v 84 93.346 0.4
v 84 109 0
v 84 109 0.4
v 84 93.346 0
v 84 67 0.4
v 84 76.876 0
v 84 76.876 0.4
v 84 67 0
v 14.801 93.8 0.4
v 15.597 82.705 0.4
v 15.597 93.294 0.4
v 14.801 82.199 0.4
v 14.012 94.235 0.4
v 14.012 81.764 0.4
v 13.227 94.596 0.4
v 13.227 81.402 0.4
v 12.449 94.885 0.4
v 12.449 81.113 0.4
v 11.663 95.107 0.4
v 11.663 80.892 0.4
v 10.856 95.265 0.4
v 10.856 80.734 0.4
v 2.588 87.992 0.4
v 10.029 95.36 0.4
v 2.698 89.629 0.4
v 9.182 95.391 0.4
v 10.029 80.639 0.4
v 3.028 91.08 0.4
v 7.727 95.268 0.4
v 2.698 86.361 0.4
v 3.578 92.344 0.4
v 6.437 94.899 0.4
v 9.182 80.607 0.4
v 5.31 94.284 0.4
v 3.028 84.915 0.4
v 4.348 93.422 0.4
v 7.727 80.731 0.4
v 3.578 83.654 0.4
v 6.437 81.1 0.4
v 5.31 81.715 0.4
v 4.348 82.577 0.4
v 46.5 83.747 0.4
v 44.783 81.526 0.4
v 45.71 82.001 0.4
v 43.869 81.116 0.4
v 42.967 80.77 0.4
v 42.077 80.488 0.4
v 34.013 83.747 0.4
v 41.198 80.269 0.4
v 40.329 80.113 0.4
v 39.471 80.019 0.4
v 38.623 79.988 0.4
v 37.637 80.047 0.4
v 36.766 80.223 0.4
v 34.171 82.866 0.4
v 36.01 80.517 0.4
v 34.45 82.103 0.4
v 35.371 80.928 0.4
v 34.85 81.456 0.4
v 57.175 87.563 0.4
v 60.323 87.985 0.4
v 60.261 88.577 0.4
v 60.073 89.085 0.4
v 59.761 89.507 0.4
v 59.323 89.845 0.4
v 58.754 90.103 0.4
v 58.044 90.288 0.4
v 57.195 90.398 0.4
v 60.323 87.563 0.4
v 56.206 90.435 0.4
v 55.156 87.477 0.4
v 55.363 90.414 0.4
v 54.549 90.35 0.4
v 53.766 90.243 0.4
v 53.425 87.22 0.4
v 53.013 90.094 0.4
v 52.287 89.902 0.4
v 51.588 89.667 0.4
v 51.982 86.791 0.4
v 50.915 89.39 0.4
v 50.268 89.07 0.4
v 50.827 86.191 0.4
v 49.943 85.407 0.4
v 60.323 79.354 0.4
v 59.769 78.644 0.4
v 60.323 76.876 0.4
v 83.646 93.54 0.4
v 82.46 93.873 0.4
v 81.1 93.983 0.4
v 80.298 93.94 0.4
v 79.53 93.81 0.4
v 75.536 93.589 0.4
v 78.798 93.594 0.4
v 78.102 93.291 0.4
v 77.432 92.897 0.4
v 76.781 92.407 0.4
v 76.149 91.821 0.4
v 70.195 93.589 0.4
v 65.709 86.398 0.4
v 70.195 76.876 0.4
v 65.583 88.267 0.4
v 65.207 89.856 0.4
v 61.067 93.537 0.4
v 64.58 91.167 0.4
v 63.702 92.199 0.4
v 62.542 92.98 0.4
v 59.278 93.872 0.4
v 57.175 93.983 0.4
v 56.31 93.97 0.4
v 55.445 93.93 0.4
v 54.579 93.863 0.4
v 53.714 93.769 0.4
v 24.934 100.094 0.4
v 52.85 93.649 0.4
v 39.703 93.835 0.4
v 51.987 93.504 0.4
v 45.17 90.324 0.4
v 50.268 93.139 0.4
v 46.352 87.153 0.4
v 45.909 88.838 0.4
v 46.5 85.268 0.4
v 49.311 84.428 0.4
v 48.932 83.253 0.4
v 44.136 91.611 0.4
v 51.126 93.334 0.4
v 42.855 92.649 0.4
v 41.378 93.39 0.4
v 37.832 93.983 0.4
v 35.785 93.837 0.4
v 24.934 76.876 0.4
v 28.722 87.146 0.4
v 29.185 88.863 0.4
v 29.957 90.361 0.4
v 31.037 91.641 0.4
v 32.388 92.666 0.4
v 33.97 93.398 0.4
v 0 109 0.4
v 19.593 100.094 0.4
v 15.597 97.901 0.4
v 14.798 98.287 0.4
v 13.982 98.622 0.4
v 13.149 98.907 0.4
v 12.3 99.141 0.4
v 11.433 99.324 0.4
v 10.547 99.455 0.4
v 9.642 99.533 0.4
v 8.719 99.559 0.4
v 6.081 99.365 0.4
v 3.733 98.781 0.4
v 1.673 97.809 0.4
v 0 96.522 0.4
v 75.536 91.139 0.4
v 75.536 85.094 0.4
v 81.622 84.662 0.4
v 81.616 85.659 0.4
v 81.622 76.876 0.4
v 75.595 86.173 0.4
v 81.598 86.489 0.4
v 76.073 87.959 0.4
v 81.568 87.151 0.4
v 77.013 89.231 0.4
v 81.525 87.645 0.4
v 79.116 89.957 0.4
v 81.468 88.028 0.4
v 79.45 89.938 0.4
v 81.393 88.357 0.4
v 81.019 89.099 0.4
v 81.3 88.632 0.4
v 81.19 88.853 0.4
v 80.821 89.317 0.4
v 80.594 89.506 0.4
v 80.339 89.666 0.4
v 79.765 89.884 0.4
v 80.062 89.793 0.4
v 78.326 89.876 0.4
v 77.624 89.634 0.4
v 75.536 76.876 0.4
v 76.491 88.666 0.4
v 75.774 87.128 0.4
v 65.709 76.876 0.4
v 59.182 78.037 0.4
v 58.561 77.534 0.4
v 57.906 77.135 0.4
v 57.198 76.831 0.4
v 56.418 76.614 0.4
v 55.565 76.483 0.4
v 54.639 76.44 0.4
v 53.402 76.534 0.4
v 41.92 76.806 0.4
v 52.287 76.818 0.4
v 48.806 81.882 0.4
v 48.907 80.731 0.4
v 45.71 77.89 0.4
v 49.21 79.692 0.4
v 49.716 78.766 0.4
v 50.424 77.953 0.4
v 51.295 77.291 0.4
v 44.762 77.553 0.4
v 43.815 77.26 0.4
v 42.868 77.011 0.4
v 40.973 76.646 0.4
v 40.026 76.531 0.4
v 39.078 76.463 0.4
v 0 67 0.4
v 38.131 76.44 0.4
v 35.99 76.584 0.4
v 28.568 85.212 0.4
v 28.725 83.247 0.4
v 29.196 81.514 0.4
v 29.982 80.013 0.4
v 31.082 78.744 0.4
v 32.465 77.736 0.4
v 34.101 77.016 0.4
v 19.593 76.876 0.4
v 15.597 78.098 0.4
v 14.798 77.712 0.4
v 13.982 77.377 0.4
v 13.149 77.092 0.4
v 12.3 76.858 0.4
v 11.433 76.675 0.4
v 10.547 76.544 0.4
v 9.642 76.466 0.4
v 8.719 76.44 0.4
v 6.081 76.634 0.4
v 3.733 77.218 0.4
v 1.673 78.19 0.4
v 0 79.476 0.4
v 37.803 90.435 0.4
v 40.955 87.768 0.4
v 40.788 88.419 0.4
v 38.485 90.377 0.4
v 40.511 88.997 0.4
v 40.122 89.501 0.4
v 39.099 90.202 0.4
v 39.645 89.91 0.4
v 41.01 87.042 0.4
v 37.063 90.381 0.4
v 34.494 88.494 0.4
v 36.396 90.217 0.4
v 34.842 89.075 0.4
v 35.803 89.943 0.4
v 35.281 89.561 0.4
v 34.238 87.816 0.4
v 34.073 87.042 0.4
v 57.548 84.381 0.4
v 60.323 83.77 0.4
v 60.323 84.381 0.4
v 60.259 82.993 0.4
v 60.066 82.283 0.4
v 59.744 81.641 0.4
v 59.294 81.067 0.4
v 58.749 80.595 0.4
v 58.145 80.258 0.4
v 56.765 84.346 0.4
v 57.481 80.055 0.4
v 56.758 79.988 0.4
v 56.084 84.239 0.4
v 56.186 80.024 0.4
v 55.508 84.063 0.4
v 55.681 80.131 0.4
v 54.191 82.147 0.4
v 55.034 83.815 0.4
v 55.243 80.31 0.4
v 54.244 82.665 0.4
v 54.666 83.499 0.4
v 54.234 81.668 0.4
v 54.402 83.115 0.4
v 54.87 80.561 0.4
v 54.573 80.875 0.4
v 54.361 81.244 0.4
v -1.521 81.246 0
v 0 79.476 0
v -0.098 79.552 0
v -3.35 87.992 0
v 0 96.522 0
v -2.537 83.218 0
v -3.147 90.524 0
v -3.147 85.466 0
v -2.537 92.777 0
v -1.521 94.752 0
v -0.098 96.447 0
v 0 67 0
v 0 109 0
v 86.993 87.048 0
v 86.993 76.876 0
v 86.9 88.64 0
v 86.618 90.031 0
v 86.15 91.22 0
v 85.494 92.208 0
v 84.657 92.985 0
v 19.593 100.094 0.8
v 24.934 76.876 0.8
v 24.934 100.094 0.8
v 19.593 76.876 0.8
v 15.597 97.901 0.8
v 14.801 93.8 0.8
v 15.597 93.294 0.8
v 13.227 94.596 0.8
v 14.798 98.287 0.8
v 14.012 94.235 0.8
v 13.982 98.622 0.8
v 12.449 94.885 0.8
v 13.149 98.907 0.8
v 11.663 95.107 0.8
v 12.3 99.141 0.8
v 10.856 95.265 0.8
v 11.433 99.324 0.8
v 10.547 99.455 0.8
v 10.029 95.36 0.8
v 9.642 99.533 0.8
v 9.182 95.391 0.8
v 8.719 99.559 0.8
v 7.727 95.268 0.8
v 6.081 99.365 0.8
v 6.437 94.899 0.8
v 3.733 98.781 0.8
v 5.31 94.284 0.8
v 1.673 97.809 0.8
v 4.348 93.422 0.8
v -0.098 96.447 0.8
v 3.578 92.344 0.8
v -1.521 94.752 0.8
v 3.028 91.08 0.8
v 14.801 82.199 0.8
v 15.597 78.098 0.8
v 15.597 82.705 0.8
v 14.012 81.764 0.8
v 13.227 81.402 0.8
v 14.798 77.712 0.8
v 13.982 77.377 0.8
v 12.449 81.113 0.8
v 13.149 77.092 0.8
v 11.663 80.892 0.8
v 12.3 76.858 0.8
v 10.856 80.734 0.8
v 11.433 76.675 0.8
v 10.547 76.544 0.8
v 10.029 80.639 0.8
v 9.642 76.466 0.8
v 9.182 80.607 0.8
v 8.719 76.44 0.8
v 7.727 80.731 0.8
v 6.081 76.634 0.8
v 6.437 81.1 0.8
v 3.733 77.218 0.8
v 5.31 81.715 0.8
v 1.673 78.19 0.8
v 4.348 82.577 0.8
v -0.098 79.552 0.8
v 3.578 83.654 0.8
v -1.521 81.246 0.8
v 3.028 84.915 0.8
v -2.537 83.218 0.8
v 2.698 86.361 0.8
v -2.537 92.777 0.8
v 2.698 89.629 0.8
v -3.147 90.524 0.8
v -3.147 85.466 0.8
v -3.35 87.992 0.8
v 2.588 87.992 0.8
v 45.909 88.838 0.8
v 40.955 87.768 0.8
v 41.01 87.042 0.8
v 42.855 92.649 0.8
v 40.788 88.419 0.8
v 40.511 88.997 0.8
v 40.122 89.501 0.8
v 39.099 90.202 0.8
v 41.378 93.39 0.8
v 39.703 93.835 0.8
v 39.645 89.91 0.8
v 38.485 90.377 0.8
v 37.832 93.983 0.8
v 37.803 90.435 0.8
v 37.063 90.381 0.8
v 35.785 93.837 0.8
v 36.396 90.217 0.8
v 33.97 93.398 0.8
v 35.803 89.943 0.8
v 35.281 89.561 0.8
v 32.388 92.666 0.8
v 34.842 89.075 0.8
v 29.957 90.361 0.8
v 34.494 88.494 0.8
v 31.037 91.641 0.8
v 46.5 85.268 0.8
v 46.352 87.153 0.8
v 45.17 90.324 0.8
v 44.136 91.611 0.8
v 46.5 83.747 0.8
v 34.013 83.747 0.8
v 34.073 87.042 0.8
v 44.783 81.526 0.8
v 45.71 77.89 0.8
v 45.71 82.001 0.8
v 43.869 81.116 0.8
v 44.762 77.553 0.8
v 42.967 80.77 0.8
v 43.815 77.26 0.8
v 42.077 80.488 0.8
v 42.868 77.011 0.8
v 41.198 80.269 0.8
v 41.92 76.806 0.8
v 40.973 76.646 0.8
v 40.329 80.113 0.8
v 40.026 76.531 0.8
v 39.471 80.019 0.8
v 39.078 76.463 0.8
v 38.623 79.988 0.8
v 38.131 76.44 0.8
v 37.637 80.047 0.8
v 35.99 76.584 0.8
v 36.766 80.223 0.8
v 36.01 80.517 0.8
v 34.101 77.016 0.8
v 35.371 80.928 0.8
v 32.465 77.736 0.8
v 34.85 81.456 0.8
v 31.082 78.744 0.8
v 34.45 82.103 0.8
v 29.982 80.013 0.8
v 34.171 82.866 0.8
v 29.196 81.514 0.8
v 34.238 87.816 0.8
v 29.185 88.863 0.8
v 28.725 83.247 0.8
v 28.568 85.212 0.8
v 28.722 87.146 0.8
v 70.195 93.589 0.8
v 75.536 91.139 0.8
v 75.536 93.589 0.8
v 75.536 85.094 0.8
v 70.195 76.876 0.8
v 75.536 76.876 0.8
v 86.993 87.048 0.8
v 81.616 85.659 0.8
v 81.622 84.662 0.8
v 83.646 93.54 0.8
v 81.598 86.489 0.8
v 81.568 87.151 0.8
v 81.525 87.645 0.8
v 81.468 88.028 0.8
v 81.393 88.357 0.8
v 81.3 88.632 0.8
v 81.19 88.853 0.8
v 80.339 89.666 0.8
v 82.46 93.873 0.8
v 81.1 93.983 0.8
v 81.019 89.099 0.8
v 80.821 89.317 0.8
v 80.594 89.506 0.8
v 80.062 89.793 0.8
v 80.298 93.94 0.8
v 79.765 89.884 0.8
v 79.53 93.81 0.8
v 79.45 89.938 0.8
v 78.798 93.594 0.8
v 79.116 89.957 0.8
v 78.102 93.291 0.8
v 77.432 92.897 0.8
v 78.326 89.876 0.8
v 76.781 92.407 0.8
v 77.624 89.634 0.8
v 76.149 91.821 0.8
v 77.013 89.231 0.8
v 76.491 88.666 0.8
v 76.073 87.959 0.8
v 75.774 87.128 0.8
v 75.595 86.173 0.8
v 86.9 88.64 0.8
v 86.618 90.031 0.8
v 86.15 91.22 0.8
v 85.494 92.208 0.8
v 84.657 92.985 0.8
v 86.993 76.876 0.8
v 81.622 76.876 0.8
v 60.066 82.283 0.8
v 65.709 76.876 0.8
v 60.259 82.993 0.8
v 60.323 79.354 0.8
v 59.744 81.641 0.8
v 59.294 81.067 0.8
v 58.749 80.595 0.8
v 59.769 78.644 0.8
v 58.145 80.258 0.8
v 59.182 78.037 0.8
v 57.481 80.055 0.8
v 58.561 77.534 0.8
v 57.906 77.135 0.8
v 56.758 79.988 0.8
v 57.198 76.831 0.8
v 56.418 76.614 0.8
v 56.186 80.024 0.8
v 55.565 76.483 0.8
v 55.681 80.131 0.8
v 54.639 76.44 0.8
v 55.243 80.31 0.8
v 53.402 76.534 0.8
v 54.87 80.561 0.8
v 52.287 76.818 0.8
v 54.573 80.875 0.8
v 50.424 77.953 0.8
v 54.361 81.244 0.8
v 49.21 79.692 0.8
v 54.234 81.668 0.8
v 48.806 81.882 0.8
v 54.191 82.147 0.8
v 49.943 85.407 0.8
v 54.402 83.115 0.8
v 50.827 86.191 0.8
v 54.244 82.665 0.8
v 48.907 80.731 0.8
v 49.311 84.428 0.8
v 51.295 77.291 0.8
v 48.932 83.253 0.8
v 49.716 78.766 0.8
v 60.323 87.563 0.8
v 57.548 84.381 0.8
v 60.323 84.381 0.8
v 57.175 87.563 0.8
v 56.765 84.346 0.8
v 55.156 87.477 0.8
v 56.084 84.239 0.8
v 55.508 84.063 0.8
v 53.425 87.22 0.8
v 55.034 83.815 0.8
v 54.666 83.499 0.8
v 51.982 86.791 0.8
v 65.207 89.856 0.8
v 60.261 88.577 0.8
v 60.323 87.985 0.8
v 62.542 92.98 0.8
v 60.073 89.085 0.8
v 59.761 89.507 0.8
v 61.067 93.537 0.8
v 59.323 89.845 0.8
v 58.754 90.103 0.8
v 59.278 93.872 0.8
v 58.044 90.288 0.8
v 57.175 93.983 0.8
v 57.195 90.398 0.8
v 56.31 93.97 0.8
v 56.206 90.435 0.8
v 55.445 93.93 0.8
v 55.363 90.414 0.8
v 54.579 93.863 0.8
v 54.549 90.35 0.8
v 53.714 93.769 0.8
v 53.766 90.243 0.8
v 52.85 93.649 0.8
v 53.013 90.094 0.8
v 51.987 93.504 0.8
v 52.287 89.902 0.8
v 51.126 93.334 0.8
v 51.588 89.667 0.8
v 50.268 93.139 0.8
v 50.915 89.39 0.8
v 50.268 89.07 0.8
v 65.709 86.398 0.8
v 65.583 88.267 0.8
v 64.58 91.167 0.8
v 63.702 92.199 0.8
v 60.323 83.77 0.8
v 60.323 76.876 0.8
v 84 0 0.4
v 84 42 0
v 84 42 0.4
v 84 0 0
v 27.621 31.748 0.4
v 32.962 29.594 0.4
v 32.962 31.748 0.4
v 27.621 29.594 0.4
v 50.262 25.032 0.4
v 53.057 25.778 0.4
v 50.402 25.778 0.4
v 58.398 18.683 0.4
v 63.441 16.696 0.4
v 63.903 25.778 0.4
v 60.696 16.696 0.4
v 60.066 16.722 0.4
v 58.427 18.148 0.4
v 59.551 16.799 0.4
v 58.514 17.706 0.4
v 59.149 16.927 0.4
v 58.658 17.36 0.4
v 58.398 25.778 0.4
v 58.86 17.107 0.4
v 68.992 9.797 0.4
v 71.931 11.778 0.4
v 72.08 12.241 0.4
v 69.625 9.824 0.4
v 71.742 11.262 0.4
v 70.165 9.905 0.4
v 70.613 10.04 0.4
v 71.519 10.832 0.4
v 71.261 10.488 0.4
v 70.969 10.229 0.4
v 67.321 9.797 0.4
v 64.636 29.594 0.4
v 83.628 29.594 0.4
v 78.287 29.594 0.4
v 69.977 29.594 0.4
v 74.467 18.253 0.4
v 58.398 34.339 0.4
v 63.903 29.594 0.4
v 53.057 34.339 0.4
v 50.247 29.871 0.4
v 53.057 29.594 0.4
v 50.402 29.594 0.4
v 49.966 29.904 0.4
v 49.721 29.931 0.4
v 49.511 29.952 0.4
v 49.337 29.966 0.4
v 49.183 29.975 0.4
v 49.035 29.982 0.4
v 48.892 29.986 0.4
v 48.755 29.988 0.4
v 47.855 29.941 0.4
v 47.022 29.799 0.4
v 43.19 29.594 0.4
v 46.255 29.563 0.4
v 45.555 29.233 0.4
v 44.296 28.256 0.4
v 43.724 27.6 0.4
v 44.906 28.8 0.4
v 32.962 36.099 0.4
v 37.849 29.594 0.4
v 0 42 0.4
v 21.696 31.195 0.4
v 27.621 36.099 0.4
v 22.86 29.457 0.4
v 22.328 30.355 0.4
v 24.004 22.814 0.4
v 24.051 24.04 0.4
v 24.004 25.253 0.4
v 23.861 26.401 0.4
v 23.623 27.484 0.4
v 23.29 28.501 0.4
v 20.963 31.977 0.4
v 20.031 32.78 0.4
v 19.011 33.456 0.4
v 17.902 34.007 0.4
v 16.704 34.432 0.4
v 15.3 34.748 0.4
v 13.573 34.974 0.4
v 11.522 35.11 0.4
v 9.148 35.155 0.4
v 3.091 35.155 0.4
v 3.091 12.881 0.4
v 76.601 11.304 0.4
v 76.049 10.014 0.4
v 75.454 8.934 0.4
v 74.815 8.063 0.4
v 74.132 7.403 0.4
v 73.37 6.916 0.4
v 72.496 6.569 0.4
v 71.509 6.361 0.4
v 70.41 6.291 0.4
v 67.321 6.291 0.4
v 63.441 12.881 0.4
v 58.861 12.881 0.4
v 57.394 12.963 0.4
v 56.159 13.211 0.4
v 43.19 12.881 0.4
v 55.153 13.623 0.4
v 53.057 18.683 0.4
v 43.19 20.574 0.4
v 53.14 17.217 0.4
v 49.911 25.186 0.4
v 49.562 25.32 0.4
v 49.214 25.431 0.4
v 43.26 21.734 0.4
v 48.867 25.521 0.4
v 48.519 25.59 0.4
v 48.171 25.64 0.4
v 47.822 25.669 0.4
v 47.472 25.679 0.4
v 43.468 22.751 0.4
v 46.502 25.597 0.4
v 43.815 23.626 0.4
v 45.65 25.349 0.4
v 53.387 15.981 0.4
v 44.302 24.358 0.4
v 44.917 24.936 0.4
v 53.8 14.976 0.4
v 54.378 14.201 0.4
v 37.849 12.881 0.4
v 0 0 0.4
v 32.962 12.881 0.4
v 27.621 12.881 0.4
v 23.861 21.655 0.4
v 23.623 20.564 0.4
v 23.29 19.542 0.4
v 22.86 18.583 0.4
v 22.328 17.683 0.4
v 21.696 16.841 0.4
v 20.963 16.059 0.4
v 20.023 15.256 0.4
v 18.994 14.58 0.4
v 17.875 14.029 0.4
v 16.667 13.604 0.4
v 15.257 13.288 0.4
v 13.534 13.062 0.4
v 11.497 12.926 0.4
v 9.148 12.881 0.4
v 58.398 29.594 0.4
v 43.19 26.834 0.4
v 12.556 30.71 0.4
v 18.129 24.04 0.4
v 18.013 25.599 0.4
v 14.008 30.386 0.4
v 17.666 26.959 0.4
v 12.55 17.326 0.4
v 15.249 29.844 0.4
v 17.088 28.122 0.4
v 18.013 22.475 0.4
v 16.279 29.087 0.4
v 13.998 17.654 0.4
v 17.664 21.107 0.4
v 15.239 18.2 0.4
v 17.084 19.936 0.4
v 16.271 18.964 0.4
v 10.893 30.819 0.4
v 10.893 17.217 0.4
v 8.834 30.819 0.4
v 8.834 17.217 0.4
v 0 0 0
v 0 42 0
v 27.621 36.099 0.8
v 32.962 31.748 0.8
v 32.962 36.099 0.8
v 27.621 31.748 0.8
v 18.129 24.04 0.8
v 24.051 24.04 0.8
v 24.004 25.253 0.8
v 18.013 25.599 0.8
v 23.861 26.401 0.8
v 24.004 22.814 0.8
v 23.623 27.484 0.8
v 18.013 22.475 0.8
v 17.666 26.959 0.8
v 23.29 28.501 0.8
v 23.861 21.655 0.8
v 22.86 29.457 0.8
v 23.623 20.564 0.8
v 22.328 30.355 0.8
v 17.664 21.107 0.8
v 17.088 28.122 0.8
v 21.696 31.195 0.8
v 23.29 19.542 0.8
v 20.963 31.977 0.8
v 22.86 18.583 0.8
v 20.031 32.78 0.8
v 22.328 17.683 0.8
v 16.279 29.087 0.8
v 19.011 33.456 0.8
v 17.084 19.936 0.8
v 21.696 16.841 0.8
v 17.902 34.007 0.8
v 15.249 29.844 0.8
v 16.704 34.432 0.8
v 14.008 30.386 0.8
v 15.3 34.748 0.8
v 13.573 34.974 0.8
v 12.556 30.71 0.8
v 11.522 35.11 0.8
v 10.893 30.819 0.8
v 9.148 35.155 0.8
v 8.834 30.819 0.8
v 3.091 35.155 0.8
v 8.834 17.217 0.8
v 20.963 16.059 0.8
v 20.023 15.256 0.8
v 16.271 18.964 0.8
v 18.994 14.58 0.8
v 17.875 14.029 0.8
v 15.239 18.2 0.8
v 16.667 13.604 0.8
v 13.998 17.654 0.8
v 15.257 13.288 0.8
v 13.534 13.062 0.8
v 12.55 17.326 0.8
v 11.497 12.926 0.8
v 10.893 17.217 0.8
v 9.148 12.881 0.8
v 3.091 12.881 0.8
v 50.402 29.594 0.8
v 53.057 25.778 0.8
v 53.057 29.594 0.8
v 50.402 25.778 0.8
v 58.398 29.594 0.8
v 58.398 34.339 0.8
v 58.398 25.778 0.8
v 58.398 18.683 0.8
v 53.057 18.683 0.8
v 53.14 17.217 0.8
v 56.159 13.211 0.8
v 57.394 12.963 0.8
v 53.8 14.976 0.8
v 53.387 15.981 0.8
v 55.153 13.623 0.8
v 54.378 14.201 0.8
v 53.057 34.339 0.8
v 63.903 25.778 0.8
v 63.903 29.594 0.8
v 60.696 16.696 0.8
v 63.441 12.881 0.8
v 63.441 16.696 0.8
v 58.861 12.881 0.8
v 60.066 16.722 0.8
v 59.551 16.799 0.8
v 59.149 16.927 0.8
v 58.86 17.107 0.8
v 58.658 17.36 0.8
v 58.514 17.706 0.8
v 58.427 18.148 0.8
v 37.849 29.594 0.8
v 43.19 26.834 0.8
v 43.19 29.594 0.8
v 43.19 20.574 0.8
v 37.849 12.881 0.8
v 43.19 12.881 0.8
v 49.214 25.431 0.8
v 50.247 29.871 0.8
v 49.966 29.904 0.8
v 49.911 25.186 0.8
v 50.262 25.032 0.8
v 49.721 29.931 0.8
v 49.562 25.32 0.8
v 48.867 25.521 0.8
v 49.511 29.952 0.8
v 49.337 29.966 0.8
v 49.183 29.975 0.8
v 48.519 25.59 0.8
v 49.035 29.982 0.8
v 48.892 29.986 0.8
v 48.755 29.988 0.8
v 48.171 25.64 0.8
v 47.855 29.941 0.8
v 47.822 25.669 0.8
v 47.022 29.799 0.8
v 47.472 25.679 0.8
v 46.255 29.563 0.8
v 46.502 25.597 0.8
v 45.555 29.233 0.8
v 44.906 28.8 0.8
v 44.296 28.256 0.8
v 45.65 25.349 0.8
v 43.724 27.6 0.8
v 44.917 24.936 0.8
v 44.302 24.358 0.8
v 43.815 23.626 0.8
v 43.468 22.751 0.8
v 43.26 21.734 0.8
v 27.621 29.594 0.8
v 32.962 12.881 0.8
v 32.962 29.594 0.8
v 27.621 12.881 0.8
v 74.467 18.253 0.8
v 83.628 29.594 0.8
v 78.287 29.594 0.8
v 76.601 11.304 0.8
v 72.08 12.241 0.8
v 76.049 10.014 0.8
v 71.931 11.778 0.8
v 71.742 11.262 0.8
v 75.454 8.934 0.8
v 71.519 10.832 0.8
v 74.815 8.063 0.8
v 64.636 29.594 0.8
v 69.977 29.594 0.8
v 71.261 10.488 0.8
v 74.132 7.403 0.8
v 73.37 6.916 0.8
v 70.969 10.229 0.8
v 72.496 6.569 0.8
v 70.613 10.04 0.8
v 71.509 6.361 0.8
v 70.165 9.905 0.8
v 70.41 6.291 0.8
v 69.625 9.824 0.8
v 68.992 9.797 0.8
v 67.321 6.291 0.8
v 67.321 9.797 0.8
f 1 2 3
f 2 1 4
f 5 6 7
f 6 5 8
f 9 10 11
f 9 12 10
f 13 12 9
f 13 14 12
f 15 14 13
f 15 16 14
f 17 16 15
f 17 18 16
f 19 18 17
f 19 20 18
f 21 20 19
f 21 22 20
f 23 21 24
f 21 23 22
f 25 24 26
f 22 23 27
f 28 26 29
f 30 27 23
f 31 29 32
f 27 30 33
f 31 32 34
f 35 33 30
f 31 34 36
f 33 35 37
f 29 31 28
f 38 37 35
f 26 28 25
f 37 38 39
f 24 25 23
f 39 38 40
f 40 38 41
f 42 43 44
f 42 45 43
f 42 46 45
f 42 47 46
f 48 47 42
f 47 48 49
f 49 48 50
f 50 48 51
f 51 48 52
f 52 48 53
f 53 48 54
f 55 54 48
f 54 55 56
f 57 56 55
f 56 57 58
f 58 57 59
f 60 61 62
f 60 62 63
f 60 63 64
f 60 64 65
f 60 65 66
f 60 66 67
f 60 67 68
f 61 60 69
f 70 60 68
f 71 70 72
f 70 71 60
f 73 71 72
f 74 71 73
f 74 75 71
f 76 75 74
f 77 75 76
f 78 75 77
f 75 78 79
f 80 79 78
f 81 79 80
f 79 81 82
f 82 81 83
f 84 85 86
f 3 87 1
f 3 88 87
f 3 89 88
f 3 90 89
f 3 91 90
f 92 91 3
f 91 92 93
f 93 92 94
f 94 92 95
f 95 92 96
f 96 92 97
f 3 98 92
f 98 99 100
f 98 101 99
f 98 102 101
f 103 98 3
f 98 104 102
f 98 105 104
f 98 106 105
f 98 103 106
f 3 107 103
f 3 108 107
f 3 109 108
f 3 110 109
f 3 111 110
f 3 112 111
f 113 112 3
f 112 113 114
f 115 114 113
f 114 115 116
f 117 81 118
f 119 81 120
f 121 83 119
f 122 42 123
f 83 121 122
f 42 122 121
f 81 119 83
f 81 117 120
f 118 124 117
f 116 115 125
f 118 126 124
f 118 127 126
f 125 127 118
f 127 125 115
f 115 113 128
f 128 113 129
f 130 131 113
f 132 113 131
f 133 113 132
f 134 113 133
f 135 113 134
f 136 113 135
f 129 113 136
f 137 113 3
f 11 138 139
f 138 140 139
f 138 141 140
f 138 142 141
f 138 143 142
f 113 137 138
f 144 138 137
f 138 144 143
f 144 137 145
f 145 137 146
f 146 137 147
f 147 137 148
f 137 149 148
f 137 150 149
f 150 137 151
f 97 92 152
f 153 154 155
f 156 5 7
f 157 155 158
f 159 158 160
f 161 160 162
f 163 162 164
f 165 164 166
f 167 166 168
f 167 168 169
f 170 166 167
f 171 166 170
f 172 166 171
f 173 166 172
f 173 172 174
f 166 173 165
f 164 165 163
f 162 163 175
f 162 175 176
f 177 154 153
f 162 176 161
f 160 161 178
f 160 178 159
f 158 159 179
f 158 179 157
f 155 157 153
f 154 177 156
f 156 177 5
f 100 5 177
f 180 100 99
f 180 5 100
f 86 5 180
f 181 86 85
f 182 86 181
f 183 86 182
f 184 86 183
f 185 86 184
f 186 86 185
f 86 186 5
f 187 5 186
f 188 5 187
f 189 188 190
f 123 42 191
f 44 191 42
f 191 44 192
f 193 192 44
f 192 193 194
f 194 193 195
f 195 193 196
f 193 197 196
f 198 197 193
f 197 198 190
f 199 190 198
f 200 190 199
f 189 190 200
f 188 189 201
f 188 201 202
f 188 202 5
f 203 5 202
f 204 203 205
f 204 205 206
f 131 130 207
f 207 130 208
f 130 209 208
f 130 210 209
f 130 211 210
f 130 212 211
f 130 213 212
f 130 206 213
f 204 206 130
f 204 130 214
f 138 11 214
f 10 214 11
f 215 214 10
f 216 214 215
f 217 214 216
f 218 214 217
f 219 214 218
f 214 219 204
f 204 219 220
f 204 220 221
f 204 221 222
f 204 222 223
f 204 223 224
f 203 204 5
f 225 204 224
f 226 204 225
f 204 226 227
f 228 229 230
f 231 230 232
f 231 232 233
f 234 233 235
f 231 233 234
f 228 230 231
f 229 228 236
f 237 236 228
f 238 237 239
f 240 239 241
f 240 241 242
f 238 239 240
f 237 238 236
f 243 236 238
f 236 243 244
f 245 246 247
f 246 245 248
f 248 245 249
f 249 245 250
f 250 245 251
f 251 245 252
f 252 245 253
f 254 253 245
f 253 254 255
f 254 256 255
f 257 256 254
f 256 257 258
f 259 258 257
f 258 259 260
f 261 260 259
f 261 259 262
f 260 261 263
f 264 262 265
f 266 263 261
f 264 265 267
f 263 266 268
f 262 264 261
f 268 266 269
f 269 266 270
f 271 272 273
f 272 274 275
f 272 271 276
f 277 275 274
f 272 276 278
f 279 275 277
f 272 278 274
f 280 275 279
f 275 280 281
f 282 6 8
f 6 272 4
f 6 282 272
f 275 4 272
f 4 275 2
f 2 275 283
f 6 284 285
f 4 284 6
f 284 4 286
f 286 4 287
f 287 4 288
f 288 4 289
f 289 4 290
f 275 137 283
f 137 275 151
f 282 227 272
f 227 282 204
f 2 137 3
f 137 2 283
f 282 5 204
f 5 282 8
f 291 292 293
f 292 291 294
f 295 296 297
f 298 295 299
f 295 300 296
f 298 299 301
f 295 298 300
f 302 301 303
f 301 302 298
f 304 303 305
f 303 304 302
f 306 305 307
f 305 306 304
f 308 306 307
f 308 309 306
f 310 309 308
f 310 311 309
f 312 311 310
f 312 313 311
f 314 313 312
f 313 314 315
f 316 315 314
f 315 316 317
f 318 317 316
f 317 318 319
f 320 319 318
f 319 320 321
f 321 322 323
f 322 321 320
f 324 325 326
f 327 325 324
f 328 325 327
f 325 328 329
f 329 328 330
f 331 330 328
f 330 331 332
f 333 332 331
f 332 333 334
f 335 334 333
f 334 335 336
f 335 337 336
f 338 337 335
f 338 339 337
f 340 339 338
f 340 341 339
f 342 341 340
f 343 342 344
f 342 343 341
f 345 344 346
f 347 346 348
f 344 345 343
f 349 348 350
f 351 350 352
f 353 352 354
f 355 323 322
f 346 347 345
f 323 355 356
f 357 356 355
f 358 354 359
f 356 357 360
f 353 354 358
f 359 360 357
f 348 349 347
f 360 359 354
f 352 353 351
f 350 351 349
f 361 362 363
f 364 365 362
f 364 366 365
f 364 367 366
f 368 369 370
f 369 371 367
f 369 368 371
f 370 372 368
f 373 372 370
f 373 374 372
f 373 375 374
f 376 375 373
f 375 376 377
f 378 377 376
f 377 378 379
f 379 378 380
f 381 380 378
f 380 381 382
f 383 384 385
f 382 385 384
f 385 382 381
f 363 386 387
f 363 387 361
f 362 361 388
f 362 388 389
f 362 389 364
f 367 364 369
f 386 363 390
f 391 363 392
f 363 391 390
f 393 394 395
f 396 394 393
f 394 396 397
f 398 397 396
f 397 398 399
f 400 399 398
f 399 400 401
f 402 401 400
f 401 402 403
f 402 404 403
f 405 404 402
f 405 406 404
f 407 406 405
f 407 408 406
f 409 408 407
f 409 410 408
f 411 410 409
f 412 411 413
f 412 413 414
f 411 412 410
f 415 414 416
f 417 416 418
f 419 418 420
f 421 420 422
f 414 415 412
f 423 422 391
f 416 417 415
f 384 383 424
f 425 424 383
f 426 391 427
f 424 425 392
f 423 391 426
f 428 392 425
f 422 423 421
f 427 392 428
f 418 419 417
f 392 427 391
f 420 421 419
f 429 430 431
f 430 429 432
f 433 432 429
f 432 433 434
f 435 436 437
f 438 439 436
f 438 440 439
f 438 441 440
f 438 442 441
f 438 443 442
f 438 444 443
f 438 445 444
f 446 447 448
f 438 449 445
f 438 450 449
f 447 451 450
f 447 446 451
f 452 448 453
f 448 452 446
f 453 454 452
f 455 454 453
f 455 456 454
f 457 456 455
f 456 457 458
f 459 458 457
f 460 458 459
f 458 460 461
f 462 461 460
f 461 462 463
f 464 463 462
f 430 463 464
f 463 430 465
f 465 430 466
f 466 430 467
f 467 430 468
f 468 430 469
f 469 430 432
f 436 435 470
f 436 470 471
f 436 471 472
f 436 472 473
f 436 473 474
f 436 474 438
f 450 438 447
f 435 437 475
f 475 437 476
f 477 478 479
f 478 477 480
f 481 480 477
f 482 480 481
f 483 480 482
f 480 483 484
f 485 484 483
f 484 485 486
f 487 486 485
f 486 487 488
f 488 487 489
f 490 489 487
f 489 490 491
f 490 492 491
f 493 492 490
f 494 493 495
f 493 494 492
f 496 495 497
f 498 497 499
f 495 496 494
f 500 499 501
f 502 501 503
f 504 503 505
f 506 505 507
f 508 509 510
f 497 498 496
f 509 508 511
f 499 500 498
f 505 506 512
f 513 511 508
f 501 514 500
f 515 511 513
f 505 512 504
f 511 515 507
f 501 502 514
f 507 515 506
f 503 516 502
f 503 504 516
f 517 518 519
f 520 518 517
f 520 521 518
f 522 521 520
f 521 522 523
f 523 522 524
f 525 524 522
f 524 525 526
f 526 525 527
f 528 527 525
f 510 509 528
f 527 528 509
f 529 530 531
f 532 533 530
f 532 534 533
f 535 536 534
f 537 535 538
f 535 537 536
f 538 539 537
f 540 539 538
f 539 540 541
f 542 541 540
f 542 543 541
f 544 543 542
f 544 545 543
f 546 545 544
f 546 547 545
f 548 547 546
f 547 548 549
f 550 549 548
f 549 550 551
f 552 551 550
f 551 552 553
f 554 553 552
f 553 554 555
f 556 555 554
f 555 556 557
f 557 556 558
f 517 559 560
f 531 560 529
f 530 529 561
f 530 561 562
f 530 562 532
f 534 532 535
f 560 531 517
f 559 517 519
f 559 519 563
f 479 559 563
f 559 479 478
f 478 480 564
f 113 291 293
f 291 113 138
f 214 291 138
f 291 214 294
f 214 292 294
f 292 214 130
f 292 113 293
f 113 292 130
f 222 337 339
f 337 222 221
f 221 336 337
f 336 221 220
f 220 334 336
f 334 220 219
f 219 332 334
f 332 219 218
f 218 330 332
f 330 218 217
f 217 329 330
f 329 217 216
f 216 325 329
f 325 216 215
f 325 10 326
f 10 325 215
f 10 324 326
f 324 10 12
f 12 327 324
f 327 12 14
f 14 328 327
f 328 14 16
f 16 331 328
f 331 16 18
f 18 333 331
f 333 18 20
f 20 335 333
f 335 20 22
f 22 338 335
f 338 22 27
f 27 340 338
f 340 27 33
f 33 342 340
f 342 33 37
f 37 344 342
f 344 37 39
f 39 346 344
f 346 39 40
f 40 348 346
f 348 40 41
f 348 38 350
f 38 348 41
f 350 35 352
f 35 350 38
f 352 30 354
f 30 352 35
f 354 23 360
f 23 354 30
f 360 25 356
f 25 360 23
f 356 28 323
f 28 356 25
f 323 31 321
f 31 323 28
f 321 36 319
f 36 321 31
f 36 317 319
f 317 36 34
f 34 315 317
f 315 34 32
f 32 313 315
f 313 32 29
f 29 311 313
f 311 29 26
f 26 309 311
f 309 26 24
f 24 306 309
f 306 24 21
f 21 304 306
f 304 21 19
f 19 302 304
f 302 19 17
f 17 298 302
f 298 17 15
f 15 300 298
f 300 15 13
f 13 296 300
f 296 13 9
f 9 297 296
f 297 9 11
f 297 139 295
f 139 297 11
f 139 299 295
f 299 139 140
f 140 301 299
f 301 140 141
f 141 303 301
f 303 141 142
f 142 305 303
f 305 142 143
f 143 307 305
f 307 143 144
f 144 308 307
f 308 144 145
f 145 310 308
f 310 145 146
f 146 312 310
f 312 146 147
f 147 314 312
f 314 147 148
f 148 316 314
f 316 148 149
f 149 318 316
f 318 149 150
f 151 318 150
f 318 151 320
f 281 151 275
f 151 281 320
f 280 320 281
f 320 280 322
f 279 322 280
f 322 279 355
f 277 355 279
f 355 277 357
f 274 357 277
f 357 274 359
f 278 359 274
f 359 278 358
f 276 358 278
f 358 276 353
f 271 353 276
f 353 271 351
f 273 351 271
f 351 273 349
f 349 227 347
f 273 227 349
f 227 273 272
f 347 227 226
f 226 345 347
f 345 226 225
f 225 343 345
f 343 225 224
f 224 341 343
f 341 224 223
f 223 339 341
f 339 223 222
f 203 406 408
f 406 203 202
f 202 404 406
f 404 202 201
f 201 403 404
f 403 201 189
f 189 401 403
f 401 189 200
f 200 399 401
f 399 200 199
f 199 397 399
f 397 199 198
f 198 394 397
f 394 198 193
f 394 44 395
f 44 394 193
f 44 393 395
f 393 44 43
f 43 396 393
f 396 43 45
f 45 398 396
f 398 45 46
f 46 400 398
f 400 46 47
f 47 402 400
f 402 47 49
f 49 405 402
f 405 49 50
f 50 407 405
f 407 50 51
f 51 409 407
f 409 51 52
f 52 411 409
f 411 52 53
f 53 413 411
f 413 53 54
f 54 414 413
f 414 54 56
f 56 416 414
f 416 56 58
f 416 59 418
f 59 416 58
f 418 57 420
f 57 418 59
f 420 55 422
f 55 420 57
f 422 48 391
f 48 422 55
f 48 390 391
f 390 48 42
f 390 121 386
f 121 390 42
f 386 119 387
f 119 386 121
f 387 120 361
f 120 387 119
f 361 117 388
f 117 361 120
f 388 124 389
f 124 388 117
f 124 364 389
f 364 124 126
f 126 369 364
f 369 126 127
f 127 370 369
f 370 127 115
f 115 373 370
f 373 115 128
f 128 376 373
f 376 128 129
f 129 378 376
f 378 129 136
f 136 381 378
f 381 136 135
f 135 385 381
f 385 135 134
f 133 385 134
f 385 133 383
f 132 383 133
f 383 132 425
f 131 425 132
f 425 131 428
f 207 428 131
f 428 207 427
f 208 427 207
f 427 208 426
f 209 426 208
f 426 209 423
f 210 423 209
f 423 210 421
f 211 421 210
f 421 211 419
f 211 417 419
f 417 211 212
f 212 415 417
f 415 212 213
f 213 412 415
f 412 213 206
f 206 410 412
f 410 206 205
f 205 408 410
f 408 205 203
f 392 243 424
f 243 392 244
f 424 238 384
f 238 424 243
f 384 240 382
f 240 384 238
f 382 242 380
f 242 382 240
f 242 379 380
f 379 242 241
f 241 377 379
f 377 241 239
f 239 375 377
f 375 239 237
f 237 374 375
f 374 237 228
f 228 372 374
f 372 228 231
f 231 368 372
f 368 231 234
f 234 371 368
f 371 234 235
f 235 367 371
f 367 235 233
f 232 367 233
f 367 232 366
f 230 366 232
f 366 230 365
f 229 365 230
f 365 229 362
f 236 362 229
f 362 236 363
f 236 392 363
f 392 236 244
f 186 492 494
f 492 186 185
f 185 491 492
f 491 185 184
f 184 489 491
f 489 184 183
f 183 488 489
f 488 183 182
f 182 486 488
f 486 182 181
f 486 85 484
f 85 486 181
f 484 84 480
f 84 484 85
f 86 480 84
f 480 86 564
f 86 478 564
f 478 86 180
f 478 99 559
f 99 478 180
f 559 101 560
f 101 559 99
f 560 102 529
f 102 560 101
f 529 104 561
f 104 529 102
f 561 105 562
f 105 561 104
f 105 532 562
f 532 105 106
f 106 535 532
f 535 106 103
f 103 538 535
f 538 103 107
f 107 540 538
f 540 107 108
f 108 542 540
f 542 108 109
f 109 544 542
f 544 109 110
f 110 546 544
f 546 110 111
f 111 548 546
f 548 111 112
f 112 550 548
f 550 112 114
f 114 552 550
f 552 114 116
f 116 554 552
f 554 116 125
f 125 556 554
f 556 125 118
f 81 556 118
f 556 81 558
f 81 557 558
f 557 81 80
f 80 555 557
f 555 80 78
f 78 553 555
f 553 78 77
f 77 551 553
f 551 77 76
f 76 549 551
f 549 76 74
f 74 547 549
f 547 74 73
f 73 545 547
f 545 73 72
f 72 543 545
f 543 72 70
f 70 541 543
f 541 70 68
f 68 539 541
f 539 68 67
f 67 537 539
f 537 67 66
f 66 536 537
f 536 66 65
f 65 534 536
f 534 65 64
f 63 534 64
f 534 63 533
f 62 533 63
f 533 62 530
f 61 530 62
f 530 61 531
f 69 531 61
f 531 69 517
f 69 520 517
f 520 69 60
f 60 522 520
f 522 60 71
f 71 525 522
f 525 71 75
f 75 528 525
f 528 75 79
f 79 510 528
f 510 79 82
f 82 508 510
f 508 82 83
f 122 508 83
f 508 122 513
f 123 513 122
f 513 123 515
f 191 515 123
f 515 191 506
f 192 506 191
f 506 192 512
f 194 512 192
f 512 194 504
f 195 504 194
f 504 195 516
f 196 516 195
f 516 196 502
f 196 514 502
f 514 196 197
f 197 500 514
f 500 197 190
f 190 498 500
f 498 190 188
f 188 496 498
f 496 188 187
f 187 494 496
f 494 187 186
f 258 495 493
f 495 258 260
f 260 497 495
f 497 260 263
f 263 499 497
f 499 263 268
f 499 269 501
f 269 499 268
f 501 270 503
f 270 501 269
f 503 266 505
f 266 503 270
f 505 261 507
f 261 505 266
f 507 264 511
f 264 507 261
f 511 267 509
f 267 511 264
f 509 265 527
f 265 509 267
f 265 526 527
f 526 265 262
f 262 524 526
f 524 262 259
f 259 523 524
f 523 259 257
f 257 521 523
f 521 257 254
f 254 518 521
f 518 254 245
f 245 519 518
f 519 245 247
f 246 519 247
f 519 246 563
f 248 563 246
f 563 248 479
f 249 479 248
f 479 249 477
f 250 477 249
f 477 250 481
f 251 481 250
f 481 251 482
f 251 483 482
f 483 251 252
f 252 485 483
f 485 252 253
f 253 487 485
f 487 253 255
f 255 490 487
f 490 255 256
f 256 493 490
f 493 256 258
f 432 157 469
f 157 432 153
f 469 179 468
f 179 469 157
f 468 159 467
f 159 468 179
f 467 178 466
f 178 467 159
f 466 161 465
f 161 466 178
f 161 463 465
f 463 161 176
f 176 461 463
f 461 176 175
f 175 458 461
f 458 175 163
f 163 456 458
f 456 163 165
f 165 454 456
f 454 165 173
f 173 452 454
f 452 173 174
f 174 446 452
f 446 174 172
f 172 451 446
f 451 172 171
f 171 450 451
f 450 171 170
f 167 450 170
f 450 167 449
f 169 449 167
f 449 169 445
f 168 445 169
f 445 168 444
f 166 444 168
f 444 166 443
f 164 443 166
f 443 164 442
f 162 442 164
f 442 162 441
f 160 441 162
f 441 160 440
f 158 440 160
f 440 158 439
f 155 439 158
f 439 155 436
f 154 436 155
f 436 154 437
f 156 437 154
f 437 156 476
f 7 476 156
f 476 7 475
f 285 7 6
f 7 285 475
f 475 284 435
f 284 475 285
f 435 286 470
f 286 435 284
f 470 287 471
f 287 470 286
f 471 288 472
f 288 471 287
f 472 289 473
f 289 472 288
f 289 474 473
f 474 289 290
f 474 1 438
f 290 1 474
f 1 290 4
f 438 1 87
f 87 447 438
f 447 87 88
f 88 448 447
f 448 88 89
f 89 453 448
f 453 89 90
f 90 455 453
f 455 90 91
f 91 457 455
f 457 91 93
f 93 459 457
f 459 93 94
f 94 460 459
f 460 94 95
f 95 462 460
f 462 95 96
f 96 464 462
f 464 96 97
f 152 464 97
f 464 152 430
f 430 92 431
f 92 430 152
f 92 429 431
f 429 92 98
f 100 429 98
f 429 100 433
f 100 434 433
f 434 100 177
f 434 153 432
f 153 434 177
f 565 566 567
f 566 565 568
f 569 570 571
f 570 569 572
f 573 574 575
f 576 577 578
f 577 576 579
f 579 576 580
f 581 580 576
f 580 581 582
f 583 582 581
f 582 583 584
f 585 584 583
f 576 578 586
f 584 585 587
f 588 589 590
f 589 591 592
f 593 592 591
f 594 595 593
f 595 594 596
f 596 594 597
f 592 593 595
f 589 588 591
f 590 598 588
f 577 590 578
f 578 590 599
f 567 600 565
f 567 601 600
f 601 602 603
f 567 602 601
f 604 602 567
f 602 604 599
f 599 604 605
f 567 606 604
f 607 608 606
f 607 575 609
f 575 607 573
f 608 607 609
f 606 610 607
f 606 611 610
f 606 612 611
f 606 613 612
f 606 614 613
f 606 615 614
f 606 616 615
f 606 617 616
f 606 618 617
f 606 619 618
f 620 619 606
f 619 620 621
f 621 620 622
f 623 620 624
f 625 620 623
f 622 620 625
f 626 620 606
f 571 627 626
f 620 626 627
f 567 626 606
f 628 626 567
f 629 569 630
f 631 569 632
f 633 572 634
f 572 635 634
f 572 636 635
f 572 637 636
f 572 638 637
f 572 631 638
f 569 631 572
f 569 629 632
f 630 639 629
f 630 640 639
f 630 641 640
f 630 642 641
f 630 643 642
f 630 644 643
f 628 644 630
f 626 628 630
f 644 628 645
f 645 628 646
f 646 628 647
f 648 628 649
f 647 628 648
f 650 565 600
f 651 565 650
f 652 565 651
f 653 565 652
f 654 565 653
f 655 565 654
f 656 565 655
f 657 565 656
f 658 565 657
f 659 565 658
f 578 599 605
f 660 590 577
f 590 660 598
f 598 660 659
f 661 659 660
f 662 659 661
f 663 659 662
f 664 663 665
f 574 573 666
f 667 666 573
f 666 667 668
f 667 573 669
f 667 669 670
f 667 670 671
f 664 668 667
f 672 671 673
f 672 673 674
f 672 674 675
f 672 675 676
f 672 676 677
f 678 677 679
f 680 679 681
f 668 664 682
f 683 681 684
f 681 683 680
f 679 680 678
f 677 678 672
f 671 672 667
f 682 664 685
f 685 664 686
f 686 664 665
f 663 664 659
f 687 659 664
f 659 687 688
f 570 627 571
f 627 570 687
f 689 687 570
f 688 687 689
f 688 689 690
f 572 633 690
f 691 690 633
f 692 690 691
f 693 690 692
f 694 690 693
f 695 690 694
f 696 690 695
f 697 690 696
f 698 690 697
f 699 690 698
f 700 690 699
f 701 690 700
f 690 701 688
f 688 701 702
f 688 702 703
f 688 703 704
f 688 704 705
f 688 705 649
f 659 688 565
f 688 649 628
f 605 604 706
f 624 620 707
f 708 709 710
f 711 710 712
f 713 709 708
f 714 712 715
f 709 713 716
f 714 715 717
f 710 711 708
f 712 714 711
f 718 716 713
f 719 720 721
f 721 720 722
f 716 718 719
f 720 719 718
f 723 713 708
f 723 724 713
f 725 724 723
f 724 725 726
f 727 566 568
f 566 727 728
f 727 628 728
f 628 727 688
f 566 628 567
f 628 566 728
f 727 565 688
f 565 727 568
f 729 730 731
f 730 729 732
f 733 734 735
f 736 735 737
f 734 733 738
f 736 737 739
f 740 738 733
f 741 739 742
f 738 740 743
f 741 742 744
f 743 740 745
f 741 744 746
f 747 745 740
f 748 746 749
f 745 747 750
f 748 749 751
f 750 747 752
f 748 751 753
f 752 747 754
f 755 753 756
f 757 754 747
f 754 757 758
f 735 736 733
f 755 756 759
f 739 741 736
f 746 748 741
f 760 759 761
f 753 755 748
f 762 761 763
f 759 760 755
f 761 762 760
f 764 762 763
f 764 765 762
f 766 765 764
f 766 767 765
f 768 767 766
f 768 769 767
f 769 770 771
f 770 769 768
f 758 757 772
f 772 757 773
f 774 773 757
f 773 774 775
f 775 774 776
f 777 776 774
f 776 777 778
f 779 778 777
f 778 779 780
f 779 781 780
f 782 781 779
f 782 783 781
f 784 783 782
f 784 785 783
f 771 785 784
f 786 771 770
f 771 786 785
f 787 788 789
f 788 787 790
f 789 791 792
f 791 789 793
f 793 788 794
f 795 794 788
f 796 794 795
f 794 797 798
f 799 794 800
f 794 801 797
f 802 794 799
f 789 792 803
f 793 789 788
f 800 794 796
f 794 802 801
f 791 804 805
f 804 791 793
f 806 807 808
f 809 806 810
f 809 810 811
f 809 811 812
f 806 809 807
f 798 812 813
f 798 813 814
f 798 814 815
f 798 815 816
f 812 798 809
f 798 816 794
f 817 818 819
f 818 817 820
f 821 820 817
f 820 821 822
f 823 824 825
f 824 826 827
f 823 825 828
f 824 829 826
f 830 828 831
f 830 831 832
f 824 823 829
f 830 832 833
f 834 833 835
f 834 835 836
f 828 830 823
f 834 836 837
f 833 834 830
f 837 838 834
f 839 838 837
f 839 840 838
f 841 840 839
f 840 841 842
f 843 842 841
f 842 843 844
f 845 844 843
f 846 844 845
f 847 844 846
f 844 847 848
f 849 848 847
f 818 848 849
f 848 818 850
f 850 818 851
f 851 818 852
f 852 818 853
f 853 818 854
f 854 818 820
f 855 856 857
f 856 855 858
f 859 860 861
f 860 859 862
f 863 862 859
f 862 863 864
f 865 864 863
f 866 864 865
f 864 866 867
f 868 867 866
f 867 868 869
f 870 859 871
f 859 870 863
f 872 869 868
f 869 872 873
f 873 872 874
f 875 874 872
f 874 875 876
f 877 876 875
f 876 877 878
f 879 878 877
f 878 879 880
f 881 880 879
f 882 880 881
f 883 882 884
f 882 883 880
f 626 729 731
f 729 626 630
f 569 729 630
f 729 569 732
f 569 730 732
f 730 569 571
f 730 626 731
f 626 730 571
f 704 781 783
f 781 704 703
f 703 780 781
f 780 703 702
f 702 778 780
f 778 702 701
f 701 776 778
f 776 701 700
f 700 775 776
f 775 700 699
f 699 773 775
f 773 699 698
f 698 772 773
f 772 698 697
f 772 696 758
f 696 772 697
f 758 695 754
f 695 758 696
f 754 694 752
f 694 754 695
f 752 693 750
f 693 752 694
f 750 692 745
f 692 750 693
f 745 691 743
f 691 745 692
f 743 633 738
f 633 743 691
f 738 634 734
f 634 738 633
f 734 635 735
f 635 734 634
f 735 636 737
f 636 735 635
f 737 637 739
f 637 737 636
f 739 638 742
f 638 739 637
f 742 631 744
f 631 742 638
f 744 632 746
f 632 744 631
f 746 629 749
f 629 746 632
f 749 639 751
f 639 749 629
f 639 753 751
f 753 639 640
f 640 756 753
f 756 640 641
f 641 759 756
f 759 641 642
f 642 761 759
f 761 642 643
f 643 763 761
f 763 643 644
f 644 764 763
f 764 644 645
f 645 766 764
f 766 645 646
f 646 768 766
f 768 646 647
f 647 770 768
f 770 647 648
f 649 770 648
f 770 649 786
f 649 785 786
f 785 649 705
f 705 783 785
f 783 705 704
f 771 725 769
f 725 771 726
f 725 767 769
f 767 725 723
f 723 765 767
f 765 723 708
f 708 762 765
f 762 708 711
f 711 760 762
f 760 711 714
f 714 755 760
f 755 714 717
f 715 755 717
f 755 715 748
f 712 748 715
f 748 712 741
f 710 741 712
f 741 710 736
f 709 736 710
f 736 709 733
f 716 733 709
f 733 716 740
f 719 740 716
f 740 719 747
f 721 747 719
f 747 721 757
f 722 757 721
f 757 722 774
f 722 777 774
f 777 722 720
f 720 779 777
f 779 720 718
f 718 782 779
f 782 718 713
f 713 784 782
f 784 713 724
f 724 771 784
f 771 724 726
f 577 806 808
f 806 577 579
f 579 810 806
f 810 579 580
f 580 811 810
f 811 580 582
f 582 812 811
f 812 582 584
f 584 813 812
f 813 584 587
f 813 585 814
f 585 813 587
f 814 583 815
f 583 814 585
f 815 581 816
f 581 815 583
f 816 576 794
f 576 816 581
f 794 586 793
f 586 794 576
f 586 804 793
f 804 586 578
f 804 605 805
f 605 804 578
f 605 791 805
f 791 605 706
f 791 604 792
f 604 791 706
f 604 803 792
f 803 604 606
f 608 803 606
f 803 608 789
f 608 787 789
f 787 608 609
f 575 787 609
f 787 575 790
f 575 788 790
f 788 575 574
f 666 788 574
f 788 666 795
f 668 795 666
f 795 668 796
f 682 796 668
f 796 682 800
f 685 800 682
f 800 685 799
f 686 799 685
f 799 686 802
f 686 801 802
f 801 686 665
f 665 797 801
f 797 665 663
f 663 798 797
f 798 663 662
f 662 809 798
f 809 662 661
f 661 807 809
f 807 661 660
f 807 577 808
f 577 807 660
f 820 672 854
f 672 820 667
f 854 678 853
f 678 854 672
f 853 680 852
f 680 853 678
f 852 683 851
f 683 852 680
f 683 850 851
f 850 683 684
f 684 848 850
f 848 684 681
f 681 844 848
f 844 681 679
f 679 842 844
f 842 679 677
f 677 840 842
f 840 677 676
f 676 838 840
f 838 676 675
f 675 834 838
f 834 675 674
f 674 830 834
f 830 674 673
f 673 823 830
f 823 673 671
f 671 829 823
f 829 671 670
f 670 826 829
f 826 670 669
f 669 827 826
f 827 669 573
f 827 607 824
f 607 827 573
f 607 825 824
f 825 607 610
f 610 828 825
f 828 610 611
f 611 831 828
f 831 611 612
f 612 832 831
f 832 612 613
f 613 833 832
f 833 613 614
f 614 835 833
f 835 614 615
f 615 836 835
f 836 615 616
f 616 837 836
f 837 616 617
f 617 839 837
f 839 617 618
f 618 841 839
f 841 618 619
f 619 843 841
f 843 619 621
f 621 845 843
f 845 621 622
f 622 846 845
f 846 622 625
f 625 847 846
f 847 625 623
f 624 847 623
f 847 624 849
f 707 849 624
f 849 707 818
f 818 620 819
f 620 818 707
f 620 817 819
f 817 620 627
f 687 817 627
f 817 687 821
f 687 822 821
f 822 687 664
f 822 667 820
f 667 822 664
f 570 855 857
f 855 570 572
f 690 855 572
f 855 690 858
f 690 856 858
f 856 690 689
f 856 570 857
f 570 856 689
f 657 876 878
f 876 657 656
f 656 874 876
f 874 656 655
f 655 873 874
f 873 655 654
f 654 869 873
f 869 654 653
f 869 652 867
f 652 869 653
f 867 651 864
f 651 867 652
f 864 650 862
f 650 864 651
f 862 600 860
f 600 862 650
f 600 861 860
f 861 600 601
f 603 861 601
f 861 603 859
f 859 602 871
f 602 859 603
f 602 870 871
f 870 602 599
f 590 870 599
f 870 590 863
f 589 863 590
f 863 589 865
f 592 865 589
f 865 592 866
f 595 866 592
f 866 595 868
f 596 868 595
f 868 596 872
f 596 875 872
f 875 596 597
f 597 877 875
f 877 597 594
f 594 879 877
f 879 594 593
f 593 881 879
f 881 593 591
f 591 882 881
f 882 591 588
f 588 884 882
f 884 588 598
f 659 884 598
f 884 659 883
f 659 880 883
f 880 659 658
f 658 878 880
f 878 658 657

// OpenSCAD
/* [Font and Text Settings] */

// text for sign 1
text1     =  "Clean";
// color of sign 1
sign1_color = "Green";  // [Red, Orange, Yellow, Green, Blue, Indigo, Violet]

// text for sign 2
text2     =  "Dirty";
// color of sign 1
sign2_color = "Red";  // [Red, Orange, Yellow, Green, Blue, Indigo, Violet]

// Font Family
fontname  = "Trebuchet";  // [Trebuchet, Noto Sans, Roboto, Open Sans Condensed, Ubuntu Sans, Montserrat]
// Font Style
fontstyle = "Bold";  // [Regular,Bold,Light,Italic,Bold Italic,Light Italic]
// Font Size
fontsize  = 22;  // .1


/* [Sign Baseplate Dimensions] */

// width of the sign
width  = 84;  // .1

// height of the sign
height  = 42;  // .1

// depth of the sign
depth = 0.4;  // .1
// Bergeron720's design allows for max 1mm plates, so I suggest you keep the height to 0.8mm. 
// That is: 2x 0.2mm layers of the color, and 2x 0.2mm layers of the text



// MODULES
// colors are not necessary, it just helps to debug the code
module greenplate() {
    color(sign1_color)
    translate([0, height + 25,0])
    cube([width, height, depth]);

    color("White")
    linear_extrude(depth*2) {
        translate([width/2, height + 25 + height/2, 0])
        text(text1, size=fontsize, font=str(fontname, ":", fontstyle), valign="center", halign="center");
    }
}

module redplate() {
    color(sign2_color)
    cube([width, height, depth]);

    color("White")
    linear_extrude(depth*2) {    
        translate([width/2, height/2, 0])
        text(text2, size=fontsize, font=str(fontname, ":", fontstyle), valign="center", halign="center");
    }
}


//MAIN CODE
greenplate();
redplate();


// PARAMETRIC DISHWASHER SIGN PLATES
//
// Colored plates for Bergeron720's dishwasher sign https://makerworld.com/en/models/965214-clean-dirty-dishwasher-sign?from=search#profileId-935601
//
// Author: RobotAnna
// https://www.printables.com/@RobotAnna
//
// CC Public Domain
// http://creativecommons.org/publicdomain/zero/1.0/
